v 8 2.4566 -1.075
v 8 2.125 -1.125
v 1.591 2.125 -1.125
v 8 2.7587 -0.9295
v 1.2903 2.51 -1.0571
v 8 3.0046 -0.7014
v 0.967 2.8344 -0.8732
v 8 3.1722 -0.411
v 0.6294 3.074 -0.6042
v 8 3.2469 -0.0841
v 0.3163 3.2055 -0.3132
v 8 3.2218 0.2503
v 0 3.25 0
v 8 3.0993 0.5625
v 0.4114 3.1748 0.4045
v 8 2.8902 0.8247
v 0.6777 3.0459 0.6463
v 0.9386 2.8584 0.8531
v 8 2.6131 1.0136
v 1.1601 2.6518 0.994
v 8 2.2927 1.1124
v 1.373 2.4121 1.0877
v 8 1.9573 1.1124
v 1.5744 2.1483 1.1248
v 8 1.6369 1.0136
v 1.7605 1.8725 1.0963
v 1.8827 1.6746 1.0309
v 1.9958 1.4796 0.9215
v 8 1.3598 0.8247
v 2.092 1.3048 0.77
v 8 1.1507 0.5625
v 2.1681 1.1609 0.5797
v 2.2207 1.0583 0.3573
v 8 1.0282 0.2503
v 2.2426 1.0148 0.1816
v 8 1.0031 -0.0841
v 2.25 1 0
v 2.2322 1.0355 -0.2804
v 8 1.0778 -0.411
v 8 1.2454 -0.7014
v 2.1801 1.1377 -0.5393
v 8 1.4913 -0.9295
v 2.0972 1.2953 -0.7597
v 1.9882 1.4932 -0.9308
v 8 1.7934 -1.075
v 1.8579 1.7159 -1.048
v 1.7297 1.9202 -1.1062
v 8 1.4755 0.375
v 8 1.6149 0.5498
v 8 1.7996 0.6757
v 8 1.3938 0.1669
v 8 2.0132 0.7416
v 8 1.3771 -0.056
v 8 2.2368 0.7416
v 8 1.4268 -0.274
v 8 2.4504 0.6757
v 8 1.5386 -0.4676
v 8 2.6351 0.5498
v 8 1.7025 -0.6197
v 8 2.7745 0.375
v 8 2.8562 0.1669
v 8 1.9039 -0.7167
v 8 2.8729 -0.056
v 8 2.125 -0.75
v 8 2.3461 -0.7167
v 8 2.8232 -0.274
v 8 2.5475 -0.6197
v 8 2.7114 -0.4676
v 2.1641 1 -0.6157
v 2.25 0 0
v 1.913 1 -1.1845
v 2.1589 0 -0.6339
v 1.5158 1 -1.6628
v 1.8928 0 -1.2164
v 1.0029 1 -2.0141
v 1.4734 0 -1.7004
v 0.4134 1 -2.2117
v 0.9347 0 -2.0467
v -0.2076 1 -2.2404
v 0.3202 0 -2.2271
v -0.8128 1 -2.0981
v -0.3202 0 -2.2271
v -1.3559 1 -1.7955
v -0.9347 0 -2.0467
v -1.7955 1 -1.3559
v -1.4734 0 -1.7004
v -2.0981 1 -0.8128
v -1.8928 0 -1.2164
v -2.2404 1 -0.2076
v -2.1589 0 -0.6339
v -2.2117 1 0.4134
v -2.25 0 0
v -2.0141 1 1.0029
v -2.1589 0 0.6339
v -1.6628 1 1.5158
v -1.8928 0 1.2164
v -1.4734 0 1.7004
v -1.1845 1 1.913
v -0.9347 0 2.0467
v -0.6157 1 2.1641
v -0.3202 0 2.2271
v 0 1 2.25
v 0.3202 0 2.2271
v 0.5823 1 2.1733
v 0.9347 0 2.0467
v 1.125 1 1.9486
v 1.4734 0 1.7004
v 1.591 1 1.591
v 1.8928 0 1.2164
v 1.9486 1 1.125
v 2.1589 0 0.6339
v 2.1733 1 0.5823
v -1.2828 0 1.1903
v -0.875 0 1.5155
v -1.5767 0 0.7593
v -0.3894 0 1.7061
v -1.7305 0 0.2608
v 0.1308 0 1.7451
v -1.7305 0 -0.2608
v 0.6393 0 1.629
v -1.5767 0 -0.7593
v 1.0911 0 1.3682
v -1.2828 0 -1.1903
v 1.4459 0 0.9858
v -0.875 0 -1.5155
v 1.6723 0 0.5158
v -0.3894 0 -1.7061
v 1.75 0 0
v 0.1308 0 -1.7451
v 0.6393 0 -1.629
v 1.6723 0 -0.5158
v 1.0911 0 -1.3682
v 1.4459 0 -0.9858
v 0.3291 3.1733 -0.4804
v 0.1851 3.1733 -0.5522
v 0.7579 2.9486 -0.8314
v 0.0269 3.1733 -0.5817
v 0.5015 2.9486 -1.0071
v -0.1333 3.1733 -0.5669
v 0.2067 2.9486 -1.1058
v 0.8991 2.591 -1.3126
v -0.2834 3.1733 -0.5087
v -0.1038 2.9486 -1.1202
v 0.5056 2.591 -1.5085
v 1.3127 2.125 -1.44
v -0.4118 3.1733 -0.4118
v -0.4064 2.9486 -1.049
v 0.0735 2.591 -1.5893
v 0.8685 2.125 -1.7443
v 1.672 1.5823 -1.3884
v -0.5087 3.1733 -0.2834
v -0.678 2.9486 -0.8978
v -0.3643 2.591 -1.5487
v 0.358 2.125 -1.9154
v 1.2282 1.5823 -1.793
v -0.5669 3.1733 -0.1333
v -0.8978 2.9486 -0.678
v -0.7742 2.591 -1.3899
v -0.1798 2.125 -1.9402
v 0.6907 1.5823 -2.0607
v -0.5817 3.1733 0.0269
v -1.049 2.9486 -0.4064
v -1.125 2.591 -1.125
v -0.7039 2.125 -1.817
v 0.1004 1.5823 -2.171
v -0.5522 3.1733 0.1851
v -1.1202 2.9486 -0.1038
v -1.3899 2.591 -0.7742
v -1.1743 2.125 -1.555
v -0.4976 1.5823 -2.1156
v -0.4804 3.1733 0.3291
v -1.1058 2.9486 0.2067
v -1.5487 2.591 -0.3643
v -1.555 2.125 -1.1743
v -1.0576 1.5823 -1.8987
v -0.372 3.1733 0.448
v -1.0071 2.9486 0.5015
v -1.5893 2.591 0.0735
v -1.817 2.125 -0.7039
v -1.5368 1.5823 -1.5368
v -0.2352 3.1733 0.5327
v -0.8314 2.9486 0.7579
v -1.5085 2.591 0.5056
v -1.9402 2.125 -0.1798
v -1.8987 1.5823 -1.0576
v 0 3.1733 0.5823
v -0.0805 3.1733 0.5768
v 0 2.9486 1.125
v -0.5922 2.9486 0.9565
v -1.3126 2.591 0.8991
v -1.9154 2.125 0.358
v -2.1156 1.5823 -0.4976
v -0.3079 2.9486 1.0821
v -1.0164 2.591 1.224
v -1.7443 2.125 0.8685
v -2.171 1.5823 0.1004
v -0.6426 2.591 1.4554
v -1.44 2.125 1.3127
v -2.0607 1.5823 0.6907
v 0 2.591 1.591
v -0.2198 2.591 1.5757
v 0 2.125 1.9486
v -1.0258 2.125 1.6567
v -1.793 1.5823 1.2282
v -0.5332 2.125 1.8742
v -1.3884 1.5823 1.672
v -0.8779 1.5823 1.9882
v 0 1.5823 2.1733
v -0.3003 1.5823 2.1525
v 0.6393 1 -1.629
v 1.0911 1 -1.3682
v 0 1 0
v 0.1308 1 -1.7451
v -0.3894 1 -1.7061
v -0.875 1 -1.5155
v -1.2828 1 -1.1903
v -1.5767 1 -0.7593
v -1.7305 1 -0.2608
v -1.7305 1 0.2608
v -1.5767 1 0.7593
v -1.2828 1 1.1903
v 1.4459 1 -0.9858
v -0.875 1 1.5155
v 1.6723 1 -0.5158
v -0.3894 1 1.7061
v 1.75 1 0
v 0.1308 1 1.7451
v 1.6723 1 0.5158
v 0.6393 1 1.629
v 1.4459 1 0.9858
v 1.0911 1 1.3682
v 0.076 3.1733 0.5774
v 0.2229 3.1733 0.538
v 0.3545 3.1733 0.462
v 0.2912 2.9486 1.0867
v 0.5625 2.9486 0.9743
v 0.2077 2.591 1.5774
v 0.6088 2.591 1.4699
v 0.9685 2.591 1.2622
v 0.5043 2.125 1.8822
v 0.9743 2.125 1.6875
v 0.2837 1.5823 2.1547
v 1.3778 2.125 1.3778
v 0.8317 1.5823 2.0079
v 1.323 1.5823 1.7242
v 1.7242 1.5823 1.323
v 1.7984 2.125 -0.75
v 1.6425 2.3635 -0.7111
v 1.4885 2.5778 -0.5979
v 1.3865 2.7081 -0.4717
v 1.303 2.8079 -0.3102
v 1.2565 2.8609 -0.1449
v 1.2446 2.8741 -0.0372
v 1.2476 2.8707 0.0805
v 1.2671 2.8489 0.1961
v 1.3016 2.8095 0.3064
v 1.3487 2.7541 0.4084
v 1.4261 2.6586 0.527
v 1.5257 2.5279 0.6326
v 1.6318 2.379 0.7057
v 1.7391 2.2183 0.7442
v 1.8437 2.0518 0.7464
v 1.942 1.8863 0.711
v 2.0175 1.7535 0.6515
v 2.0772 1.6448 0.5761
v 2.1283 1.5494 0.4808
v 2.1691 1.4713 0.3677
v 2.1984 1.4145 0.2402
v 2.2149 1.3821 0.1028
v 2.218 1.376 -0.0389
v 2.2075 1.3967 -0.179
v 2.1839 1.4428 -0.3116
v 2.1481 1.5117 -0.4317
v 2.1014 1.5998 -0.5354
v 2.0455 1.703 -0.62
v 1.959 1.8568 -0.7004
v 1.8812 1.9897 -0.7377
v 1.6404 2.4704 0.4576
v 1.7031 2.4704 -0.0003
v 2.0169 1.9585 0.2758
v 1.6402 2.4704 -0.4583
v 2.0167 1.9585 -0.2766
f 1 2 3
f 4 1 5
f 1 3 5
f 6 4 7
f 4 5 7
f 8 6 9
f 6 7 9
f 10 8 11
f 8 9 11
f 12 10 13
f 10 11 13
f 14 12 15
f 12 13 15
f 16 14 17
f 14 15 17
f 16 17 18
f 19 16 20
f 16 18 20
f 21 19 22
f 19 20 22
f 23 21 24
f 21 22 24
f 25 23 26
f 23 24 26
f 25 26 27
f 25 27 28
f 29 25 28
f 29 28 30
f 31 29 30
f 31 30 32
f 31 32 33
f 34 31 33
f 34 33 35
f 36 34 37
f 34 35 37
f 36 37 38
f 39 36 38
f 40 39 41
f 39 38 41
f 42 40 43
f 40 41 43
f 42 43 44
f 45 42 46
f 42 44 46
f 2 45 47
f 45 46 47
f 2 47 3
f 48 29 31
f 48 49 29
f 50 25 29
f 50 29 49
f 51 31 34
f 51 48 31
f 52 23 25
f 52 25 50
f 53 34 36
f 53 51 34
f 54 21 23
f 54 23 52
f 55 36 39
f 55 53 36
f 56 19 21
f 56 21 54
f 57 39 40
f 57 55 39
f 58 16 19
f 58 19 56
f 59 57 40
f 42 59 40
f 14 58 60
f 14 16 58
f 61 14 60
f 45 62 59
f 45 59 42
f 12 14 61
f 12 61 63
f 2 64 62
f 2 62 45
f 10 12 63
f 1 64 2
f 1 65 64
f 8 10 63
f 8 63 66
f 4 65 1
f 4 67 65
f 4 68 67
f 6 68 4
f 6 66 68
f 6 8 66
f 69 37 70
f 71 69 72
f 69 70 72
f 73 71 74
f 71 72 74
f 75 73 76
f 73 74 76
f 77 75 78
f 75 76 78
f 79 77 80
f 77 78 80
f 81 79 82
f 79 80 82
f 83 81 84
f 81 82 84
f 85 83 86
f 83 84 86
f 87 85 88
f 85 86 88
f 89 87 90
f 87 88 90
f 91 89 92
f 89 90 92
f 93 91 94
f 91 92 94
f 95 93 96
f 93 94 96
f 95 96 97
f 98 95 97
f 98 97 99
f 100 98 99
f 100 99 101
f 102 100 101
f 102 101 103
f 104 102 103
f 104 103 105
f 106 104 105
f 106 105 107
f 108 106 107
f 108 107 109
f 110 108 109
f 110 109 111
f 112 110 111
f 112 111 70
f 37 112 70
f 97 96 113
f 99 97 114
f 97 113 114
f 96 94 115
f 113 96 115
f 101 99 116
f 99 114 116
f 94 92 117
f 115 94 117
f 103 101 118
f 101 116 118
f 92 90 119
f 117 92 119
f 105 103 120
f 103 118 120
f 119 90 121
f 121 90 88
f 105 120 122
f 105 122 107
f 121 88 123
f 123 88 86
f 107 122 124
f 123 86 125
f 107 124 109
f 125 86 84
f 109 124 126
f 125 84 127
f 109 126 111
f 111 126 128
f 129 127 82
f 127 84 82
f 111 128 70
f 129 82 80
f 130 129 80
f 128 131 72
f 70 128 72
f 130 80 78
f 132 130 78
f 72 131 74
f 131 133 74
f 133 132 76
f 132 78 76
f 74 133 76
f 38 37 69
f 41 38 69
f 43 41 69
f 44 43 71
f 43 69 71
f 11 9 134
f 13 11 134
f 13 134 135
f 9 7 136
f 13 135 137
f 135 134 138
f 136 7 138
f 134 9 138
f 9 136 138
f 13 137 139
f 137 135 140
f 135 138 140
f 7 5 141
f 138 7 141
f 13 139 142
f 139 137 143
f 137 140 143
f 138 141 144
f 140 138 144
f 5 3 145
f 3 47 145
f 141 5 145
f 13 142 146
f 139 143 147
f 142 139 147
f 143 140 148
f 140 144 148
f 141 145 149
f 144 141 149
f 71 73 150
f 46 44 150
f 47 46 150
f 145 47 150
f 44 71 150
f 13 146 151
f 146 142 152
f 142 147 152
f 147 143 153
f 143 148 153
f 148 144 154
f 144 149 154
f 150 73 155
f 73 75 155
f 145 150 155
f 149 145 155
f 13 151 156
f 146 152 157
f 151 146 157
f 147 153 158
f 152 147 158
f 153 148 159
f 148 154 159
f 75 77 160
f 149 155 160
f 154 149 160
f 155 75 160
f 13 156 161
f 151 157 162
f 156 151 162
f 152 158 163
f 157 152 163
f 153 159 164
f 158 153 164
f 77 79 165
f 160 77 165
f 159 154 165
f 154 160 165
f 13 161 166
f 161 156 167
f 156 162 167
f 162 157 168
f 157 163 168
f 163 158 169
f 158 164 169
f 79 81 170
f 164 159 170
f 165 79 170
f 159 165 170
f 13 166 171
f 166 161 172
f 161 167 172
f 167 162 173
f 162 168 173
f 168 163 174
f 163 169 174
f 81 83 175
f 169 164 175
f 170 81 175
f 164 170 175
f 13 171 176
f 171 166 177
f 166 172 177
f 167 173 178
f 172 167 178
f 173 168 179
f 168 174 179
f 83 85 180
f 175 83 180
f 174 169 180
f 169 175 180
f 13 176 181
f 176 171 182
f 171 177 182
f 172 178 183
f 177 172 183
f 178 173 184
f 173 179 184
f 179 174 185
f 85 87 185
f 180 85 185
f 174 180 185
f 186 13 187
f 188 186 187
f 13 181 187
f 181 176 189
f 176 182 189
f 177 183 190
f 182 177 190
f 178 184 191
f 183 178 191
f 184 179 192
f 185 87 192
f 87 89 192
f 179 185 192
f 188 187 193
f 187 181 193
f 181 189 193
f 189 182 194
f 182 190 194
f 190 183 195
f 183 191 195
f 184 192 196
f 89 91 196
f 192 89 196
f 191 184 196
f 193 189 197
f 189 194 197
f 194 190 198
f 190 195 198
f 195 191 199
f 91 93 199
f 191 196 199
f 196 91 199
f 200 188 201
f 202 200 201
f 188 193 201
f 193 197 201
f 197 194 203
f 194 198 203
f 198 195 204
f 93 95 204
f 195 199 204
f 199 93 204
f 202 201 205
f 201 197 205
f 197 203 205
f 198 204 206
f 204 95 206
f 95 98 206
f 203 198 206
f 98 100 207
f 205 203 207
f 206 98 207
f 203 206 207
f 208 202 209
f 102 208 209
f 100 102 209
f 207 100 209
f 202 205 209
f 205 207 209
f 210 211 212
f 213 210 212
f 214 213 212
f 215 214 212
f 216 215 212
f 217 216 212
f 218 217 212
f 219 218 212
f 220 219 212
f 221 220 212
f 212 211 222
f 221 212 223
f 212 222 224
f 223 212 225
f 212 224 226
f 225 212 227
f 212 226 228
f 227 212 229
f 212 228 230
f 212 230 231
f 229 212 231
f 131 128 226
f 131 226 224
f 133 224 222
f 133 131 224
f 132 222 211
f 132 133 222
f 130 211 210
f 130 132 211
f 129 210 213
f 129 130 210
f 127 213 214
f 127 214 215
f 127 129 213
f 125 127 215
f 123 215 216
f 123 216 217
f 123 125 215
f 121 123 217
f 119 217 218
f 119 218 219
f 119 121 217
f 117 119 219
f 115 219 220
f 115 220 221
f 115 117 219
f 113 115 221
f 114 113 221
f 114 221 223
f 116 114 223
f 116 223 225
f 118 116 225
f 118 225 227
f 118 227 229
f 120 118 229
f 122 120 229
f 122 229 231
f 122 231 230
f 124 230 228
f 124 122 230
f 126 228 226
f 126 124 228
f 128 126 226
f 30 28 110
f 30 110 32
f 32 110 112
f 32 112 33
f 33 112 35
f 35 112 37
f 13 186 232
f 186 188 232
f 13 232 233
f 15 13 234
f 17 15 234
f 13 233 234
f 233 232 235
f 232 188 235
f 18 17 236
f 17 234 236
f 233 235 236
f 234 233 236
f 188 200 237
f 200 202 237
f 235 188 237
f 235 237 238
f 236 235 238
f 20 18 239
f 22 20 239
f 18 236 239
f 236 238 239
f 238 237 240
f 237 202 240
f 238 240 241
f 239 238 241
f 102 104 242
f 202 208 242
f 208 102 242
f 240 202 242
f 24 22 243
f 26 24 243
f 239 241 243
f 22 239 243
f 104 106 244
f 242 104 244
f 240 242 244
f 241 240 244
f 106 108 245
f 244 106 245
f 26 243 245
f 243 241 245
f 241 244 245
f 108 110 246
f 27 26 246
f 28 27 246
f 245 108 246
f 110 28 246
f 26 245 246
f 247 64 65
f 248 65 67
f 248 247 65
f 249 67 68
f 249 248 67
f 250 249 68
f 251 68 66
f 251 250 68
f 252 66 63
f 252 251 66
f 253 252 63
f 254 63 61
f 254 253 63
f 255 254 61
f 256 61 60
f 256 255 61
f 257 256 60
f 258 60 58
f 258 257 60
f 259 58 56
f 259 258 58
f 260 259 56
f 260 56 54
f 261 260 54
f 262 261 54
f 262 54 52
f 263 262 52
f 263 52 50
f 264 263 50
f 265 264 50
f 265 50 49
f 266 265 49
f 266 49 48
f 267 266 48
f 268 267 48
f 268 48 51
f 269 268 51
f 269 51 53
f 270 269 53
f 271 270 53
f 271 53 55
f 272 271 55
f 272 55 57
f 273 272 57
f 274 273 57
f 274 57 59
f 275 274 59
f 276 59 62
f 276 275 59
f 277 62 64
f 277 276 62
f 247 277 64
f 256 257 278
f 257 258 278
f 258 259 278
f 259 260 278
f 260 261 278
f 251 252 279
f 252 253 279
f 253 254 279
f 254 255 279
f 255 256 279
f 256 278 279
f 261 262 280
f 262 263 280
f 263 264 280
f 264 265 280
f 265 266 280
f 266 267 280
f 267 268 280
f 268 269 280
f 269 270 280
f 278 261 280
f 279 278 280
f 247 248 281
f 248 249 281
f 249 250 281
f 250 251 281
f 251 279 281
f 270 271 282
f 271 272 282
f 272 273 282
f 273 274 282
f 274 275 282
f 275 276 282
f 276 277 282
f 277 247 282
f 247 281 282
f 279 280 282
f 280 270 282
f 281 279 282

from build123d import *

# Parameters (mm, degrees)
SKETCH_1_R      = 2.25
SKETCH_1_R_2    = 1.75
EXTRUDE_1_DEPTH = 1
SKETCH_3_R      = 1.125
SKETCH_3_R_2    = 0.75
EXTRUDE_2_DEPTH = 8


with BuildPart() as part:
    # 草图1 → 凸台-拉伸1 (new body)
    with BuildSketch(Plane(origin=(0, 0, 0), x_dir=(1, 0, 0), z_dir=(0, 1, 0))):
        Circle(SKETCH_1_R)
        Circle(SKETCH_1_R_2, mode=Mode.SUBTRACT)
    extrude(amount=EXTRUDE_1_DEPTH)

    # 草图2 → 旋转1 (revolve)
    with BuildSketch(Plane(origin=(0, 0, 0), x_dir=(0, 0, -1), z_dir=(1, 0, 0))):
        with BuildLine():
            Line((0, 1), (0, 3.25))
            ThreePointArc((0, 3.25), (-1.590990258, 2.590990258), (-2.25, 1))
            Line((-2.25, 1), (0, 1))
        make_face()
    revolve(axis=Axis((0, 0, 0), (0, 1, 0)))

    # 草图3 → 凸台-拉伸2 (add)
    with BuildSketch(Plane(origin=(0, 0, 0), x_dir=(0, 0, -1), z_dir=(1, 0, 0))):
        with Locations((0, 2.125)):
            Circle(SKETCH_3_R)
        with Locations((0, 2.125)):
            Circle(SKETCH_3_R_2, mode=Mode.SUBTRACT)
    extrude(amount=EXTRUDE_2_DEPTH)


solid = part.part
